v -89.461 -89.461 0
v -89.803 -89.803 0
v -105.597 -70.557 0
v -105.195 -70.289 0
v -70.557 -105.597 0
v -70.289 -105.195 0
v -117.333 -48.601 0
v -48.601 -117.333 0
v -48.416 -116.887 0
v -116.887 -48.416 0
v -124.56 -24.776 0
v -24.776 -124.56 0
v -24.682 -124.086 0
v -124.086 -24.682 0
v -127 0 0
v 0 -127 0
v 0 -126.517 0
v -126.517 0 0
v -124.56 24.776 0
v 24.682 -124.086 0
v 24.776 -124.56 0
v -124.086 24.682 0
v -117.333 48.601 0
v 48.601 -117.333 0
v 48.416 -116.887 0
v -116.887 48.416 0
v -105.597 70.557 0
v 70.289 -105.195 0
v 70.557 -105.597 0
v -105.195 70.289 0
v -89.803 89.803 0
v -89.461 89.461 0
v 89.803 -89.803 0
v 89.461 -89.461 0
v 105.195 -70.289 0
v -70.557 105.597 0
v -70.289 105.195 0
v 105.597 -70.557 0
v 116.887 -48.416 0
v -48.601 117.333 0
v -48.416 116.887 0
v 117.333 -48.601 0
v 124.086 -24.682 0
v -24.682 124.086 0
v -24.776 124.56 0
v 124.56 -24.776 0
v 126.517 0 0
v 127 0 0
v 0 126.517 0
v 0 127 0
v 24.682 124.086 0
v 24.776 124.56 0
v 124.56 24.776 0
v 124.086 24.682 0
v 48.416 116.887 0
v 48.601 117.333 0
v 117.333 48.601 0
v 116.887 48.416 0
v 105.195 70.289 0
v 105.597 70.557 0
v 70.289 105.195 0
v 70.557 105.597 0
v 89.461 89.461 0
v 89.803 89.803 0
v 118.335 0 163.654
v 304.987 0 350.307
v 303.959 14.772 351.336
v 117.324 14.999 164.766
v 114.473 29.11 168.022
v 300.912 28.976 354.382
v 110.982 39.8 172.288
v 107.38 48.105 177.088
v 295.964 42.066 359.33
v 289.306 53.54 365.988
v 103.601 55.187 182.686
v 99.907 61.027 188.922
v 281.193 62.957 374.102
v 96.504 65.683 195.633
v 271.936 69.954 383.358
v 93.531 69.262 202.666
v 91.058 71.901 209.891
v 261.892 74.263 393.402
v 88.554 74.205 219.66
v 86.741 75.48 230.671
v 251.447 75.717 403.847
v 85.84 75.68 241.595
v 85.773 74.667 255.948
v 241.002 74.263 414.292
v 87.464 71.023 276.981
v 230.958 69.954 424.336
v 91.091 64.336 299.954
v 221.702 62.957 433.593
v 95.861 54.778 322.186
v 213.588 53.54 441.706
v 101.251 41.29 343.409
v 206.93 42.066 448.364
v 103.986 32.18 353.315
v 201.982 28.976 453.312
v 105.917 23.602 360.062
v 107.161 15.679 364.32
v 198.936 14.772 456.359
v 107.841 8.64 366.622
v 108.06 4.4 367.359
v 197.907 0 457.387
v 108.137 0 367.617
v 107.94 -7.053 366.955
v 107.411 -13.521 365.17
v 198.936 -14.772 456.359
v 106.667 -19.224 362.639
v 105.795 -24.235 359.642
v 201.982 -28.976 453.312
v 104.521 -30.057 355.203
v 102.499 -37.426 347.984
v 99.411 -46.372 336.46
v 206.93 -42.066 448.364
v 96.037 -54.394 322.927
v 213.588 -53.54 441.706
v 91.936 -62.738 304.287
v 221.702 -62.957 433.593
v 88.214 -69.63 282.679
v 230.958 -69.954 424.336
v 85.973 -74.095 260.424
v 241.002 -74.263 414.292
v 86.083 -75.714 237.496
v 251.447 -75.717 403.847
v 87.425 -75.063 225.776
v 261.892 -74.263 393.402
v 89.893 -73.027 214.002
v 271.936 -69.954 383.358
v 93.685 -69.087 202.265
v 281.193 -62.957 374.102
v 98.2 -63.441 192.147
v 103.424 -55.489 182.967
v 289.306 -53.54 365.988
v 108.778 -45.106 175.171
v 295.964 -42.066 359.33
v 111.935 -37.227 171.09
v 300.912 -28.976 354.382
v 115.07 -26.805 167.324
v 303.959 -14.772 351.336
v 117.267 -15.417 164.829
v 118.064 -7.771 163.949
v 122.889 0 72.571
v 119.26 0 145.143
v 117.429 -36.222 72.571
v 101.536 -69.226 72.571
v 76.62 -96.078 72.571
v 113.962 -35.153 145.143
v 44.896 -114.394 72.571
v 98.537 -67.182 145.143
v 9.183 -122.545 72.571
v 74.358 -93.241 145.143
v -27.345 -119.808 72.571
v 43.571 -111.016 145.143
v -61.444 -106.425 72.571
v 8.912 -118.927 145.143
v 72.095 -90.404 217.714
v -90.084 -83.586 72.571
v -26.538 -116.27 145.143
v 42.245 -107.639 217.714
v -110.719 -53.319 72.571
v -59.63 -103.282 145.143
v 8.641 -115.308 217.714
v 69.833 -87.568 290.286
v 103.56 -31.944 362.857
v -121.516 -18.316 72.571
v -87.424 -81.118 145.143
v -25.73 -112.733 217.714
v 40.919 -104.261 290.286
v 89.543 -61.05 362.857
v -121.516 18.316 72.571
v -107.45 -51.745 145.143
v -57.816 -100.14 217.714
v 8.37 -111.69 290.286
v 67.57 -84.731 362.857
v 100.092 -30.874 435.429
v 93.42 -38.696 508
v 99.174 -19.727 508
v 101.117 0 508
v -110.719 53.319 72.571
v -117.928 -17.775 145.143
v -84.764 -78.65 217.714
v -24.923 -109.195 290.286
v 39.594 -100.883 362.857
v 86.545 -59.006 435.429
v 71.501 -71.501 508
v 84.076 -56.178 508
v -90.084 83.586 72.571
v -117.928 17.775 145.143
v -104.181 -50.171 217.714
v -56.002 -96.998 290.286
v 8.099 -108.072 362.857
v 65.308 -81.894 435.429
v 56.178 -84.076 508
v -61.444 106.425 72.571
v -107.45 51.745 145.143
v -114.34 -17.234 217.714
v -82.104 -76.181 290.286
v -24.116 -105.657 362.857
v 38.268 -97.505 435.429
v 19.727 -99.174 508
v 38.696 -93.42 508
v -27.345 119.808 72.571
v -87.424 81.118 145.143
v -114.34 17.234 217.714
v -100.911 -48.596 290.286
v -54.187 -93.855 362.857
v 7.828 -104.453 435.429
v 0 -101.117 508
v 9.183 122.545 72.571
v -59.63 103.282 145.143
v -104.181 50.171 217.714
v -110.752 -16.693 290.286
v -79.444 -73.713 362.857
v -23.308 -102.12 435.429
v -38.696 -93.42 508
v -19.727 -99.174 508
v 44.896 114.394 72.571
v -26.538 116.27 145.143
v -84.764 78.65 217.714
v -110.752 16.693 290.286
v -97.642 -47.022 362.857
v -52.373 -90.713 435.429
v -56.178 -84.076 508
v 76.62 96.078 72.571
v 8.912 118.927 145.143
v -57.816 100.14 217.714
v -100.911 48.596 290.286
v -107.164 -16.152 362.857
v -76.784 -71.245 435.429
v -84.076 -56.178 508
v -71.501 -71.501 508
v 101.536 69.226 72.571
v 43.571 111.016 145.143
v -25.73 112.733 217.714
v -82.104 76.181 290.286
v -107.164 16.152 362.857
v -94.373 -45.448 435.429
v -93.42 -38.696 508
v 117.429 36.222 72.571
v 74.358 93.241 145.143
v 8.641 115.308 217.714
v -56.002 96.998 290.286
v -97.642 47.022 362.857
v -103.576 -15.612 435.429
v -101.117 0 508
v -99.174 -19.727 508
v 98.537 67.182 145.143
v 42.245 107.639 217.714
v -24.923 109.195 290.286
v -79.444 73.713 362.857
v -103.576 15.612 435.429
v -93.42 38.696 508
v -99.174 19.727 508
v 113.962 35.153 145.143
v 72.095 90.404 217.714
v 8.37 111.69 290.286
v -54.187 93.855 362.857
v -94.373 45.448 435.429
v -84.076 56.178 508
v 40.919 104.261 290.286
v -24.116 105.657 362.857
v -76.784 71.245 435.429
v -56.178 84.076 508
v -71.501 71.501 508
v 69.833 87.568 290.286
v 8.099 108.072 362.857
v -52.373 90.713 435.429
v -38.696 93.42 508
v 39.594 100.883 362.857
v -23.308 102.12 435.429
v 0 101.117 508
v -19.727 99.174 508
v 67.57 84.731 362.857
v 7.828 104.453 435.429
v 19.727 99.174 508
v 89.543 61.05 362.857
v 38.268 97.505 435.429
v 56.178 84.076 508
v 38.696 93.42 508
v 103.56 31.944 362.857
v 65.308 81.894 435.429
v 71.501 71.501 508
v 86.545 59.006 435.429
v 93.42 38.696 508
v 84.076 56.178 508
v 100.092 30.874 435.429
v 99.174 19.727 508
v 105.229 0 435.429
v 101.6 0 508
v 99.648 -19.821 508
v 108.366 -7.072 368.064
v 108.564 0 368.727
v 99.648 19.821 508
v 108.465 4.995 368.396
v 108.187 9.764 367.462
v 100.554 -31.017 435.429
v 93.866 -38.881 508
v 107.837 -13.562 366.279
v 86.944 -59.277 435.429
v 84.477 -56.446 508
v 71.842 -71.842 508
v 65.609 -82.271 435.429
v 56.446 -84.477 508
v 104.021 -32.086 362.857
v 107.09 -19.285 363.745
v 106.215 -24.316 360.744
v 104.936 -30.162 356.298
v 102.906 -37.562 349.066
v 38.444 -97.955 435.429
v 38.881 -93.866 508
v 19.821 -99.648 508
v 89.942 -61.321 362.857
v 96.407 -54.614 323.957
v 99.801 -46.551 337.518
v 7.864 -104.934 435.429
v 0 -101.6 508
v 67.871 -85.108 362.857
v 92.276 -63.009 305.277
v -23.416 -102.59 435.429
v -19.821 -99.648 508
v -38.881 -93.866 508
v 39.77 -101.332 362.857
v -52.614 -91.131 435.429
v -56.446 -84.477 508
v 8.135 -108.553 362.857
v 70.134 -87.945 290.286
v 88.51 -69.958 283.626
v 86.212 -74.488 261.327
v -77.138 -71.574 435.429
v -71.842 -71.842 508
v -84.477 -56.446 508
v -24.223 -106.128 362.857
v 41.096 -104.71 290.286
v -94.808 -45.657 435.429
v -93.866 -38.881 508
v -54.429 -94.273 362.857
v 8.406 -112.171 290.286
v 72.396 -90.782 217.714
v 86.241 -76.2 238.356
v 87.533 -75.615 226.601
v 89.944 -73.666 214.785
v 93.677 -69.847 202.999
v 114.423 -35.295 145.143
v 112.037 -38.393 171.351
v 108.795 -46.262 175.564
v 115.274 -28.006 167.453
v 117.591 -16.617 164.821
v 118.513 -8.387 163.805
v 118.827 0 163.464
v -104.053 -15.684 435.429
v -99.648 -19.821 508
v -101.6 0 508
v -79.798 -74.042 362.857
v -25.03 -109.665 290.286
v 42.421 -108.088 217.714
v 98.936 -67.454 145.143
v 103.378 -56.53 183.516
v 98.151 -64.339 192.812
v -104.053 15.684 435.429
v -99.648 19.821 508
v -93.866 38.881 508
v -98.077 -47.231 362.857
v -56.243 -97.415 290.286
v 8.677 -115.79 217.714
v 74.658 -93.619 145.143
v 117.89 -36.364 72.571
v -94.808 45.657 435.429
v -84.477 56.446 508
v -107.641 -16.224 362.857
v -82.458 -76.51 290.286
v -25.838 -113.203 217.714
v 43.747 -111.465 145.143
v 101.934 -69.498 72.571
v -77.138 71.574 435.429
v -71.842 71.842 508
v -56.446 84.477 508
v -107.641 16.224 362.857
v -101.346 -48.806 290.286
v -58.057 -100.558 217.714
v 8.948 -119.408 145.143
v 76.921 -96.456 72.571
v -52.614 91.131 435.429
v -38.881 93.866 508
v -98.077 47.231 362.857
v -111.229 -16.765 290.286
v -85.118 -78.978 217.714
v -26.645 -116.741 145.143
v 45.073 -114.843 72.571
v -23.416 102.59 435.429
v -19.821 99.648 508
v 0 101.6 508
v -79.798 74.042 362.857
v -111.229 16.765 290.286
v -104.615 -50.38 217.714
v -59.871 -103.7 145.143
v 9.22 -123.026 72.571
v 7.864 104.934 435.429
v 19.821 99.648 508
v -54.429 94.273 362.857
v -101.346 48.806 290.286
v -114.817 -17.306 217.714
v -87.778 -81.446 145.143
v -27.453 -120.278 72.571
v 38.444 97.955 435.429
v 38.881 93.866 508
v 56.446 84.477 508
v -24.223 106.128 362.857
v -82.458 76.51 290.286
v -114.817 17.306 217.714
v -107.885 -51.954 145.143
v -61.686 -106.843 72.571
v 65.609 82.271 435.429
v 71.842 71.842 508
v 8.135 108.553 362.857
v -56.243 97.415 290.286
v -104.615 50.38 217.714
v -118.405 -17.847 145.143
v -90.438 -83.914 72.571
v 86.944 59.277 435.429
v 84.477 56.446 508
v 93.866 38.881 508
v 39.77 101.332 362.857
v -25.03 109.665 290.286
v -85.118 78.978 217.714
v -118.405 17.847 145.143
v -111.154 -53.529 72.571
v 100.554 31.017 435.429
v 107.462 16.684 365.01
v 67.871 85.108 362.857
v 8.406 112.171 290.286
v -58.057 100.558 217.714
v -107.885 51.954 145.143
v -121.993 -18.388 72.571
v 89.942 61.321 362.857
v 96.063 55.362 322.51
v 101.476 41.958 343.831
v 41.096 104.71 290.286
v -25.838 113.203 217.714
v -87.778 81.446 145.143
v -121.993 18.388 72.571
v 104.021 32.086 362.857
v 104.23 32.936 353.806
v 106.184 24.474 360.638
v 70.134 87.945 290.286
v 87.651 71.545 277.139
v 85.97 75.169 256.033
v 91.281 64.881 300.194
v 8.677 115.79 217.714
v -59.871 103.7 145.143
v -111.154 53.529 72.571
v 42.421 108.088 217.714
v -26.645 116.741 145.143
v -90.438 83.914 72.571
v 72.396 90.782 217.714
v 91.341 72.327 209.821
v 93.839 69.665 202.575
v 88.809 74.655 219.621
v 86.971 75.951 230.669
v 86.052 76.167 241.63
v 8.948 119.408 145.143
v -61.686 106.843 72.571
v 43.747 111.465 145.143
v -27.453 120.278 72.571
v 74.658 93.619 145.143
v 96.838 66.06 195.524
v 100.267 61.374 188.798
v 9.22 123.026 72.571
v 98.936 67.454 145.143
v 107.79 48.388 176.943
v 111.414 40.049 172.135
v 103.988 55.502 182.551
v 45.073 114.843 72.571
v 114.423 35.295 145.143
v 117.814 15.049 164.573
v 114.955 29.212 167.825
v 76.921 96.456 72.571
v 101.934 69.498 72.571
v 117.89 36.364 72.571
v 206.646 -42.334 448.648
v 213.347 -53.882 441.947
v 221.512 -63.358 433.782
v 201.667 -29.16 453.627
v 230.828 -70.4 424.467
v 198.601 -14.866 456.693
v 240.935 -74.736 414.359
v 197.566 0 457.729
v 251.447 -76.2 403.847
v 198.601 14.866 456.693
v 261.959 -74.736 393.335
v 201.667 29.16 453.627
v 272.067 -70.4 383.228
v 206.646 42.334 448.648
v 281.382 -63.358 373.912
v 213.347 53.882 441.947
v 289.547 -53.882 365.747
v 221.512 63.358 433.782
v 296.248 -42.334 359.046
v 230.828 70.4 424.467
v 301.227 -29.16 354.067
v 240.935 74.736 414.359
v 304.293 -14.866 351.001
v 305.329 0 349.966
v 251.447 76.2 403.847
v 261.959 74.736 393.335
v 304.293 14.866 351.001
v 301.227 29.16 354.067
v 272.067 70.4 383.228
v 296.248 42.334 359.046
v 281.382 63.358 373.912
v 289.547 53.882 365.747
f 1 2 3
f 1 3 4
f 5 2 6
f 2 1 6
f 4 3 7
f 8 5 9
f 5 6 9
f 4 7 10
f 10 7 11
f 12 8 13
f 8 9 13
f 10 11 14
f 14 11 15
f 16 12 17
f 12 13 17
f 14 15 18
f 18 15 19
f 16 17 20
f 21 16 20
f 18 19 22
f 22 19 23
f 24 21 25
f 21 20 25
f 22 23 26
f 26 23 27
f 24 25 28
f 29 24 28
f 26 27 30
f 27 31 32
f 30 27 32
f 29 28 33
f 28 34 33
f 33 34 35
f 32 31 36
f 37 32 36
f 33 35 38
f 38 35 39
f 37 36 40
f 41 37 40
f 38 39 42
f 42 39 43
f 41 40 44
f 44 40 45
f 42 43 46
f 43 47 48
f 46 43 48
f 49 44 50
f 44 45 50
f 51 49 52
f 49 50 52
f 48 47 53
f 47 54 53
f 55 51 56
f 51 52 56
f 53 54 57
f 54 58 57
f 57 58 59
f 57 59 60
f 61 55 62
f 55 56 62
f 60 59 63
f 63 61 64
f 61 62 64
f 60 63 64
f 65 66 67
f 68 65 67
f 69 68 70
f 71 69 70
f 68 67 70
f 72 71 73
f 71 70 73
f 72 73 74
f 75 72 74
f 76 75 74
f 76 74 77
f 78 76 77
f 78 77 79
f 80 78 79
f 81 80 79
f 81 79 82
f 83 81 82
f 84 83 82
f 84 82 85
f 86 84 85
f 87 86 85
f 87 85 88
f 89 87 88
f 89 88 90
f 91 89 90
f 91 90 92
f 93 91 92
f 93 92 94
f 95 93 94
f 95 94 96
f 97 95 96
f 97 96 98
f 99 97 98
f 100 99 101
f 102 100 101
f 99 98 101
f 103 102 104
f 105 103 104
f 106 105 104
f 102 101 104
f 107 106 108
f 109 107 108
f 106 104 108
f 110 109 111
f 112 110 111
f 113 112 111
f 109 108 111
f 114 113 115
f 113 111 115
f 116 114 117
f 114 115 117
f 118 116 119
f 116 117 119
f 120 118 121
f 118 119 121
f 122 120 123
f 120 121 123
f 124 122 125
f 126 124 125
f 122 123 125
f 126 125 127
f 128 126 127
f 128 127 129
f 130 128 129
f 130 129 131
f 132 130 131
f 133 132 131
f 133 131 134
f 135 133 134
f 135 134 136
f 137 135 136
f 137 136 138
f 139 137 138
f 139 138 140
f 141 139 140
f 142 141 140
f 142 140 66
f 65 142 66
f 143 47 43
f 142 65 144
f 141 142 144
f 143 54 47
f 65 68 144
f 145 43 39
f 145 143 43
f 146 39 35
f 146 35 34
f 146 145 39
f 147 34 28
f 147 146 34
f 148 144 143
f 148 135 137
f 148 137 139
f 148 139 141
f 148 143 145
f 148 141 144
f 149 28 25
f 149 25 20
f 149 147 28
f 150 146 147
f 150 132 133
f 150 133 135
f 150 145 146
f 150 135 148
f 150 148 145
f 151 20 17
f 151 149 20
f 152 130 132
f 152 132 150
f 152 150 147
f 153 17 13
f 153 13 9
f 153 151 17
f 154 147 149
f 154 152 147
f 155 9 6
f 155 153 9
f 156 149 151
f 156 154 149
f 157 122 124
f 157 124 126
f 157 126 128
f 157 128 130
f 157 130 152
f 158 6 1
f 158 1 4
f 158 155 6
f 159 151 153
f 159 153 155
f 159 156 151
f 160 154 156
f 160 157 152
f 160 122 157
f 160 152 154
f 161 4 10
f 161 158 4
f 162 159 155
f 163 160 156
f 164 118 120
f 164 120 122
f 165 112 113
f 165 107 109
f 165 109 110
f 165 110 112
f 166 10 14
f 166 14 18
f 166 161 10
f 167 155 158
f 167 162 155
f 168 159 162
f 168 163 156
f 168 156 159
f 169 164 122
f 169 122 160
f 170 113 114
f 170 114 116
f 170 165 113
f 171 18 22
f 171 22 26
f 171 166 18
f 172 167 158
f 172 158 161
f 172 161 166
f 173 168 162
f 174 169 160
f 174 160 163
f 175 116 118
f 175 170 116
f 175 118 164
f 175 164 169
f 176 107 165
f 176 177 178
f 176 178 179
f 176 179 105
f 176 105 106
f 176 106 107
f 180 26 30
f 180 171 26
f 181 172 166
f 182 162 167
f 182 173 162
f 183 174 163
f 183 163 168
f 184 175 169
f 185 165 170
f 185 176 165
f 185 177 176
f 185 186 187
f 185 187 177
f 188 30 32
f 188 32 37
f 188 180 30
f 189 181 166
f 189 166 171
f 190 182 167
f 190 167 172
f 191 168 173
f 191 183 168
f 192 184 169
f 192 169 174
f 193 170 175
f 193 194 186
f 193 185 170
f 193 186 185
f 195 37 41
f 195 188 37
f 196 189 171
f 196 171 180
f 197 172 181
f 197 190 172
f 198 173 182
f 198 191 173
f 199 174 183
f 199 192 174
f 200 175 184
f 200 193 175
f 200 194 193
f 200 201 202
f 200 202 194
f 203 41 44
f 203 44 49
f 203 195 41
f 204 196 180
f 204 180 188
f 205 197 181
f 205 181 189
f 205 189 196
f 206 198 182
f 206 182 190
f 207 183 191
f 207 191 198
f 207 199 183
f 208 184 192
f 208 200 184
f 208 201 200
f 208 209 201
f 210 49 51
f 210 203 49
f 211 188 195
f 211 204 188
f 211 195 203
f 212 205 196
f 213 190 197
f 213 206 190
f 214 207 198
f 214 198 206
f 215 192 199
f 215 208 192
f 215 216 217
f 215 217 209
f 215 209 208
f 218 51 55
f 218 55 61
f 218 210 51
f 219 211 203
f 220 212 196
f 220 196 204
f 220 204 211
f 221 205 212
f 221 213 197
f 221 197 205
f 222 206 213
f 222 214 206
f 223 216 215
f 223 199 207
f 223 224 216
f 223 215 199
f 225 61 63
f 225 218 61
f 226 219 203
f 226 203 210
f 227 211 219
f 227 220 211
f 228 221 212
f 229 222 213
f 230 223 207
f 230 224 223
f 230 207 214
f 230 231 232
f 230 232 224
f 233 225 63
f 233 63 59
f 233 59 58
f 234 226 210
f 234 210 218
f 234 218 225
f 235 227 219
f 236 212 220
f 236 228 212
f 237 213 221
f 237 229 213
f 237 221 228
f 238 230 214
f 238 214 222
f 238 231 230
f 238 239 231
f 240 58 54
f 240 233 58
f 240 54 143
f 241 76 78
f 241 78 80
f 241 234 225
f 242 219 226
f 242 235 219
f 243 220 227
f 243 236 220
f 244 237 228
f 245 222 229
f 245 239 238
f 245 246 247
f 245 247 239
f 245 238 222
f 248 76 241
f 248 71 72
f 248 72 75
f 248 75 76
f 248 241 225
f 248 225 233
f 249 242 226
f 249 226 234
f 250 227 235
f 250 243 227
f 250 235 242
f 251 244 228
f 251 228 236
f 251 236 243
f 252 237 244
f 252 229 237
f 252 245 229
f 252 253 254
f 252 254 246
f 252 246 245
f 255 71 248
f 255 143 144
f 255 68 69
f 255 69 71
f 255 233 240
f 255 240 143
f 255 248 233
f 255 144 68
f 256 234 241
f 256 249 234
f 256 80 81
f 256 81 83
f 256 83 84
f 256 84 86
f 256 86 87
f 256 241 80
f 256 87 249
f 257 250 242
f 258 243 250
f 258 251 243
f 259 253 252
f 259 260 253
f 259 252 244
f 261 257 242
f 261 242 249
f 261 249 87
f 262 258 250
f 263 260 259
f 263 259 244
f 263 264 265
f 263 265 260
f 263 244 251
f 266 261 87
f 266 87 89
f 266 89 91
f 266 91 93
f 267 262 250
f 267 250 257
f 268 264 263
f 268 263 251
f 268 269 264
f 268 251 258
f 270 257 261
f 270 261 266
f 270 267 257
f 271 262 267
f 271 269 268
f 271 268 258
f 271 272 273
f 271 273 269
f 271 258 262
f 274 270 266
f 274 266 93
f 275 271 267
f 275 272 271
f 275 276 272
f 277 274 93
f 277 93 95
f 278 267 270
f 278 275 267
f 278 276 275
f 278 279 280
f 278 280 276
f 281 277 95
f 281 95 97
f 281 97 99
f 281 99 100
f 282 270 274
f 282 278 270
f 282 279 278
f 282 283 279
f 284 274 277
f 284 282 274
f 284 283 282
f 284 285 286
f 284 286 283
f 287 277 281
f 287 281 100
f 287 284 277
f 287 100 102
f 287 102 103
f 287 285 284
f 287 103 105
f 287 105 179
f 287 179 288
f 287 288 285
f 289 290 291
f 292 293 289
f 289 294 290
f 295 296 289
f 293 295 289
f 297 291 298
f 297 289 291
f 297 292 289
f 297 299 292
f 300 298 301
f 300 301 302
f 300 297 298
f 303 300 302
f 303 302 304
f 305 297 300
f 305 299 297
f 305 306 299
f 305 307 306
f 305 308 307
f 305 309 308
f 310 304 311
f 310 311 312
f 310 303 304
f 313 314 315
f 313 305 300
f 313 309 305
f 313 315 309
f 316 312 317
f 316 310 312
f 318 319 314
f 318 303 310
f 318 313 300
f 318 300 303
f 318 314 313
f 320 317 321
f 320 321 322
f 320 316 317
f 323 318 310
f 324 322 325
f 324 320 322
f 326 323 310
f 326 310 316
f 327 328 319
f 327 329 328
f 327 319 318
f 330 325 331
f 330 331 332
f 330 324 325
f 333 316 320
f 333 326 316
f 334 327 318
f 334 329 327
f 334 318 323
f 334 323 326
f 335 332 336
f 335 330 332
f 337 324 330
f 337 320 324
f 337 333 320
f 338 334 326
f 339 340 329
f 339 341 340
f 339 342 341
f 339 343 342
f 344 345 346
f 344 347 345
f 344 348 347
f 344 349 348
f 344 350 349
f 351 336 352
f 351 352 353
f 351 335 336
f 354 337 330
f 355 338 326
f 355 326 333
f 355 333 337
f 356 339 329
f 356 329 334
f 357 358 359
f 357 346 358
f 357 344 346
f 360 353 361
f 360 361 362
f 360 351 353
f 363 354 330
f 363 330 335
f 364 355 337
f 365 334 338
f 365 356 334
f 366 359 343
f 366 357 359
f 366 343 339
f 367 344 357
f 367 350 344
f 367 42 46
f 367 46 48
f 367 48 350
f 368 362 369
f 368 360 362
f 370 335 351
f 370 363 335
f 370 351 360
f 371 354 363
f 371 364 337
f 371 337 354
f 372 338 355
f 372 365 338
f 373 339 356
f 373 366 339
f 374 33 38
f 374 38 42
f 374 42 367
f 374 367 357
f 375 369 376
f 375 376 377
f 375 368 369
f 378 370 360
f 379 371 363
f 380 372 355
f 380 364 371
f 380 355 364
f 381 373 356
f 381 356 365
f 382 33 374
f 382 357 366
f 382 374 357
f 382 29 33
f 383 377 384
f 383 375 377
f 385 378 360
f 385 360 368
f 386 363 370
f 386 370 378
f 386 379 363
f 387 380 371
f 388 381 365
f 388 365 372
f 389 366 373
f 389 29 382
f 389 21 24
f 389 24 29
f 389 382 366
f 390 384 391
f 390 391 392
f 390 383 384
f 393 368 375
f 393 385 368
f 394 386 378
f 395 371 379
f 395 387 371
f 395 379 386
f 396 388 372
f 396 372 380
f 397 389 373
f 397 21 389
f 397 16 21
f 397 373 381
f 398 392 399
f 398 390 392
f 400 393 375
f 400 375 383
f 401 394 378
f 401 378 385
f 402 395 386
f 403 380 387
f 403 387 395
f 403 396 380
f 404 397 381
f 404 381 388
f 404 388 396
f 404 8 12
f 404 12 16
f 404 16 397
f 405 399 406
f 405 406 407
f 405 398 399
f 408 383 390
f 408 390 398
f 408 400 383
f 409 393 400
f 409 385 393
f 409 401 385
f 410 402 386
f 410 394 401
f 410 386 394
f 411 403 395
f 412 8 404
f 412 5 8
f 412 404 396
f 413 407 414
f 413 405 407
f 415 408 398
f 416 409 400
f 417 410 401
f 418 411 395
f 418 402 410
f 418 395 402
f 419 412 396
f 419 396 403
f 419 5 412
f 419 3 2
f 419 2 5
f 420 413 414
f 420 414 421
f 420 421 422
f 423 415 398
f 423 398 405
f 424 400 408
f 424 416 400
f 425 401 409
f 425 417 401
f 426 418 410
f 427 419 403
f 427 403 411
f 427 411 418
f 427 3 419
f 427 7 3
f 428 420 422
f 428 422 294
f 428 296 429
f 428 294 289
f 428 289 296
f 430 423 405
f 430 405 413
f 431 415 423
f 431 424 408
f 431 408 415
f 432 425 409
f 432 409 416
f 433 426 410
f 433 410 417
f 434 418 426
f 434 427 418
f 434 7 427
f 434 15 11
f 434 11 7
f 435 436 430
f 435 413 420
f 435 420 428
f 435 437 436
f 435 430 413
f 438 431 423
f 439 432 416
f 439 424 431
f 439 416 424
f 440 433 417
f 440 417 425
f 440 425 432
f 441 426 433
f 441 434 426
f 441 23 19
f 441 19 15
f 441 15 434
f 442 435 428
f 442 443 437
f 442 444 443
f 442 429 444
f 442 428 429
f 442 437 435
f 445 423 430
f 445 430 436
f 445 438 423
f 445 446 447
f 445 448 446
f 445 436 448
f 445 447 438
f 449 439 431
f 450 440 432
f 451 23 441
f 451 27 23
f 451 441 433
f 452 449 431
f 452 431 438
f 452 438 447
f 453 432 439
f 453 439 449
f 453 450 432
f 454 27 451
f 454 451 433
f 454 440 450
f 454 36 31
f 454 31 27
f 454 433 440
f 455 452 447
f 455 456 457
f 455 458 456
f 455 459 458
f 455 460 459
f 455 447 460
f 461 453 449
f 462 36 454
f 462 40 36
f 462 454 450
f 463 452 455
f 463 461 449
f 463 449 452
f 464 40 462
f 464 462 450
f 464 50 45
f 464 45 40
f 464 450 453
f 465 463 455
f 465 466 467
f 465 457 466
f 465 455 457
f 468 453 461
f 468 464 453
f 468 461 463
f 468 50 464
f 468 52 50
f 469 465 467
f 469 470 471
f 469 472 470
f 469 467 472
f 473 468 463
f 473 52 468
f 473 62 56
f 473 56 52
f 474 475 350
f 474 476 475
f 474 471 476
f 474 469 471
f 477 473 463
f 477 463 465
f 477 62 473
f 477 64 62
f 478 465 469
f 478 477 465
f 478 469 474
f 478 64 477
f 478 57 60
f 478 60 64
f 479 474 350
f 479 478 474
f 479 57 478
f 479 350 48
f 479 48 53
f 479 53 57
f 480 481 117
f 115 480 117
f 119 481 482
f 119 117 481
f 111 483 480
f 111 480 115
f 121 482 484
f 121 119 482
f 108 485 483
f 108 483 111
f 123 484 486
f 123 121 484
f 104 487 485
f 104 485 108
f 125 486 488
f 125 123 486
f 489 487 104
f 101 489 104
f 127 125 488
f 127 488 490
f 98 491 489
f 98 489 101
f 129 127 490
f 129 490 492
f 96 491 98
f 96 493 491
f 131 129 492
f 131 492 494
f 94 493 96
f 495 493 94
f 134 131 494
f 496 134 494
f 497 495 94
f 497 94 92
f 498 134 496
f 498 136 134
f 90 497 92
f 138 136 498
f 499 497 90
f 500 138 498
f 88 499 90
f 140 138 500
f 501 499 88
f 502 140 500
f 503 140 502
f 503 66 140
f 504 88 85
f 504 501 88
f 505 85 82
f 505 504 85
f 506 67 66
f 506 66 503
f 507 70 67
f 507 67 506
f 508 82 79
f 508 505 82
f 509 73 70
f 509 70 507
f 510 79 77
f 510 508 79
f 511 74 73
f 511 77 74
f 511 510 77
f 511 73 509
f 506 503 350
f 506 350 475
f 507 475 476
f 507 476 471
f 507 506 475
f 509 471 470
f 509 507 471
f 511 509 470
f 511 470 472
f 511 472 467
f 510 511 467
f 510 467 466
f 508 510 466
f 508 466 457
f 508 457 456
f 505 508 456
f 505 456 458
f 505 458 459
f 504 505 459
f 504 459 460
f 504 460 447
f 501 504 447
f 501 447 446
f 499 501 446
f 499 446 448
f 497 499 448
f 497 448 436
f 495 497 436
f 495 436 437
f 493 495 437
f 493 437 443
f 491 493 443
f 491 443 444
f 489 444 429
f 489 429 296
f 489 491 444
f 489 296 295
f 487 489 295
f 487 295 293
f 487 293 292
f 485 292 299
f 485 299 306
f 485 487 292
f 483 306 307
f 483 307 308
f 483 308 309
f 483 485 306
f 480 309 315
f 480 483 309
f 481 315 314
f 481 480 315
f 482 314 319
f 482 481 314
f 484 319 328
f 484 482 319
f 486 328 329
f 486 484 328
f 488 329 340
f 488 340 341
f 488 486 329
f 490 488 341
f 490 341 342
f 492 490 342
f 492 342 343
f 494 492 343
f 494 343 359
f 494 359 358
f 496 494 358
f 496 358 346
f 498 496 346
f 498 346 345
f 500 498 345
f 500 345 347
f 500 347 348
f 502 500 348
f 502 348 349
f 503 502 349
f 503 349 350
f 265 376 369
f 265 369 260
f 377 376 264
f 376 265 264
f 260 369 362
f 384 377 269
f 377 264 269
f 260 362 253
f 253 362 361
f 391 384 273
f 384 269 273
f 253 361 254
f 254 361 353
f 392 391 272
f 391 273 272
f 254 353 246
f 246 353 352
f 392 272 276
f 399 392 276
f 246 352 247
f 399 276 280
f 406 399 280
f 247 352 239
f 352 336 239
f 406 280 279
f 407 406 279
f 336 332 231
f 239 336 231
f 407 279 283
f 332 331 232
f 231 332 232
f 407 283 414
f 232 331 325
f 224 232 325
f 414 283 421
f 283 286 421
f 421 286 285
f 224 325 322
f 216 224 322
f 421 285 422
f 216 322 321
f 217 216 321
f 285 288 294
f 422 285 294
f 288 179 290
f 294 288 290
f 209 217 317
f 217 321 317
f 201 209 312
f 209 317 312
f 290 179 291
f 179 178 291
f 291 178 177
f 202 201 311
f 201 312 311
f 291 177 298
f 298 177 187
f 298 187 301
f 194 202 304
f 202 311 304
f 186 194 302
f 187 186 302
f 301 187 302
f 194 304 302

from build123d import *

# Parameters (mm, degrees)
F5_R      = 101.6
F4_R      = 127
F7_R      = 76.2
F8_DEPTH  = 304.8
F9_R      = 75.7174
F10_DEPTH = 304.8
F11_R     = 126.5174
F12_R     = 101.1174


with BuildPart() as f6:
    # F5 (on face) → F6 section 0
    with BuildSketch(Plane(origin=(0, 0, 508), x_dir=(1, 0, 0), z_dir=(0, 0, -1))):
        Circle(F5_R)
    # F4 (on face) → F6 section 1
    with BuildSketch(Plane.XY):
        Circle(F4_R)
    loft()

    # F7 (on face) → F8 (join)
    with BuildSketch(Plane(origin=(327.647171, 0, 327.647171), x_dir=(0.707107, 0, -0.707107), z_dir=(0.707107, 0, 0.707107))):
        with Locations((-107.763073, 0)):
            Circle(F7_R)
    extrude(amount=-F8_DEPTH)

    # F9 (on face) → F10 (cut)
    with BuildSketch(Plane(origin=(327.647171, 0, 327.647171), x_dir=(0.707107, 0, -0.707107), z_dir=(0.707107, 0, 0.707107))):
        with Locations((-107.763073, 0)):
            Circle(F9_R)
    extrude(amount=-F10_DEPTH, mode=Mode.SUBTRACT)

    # F11 (on face) → F13 section 0
    with BuildSketch(Plane(origin=(0, 0, 0), x_dir=(1, 0, 0), z_dir=(0, 0, -1))):
        Circle(F11_R)
    # F12 (on face) → F13 section 1
    with BuildSketch(Plane.XY.offset(508)):
        Circle(F12_R)
    loft(mode=Mode.SUBTRACT)


solid = f6.part
